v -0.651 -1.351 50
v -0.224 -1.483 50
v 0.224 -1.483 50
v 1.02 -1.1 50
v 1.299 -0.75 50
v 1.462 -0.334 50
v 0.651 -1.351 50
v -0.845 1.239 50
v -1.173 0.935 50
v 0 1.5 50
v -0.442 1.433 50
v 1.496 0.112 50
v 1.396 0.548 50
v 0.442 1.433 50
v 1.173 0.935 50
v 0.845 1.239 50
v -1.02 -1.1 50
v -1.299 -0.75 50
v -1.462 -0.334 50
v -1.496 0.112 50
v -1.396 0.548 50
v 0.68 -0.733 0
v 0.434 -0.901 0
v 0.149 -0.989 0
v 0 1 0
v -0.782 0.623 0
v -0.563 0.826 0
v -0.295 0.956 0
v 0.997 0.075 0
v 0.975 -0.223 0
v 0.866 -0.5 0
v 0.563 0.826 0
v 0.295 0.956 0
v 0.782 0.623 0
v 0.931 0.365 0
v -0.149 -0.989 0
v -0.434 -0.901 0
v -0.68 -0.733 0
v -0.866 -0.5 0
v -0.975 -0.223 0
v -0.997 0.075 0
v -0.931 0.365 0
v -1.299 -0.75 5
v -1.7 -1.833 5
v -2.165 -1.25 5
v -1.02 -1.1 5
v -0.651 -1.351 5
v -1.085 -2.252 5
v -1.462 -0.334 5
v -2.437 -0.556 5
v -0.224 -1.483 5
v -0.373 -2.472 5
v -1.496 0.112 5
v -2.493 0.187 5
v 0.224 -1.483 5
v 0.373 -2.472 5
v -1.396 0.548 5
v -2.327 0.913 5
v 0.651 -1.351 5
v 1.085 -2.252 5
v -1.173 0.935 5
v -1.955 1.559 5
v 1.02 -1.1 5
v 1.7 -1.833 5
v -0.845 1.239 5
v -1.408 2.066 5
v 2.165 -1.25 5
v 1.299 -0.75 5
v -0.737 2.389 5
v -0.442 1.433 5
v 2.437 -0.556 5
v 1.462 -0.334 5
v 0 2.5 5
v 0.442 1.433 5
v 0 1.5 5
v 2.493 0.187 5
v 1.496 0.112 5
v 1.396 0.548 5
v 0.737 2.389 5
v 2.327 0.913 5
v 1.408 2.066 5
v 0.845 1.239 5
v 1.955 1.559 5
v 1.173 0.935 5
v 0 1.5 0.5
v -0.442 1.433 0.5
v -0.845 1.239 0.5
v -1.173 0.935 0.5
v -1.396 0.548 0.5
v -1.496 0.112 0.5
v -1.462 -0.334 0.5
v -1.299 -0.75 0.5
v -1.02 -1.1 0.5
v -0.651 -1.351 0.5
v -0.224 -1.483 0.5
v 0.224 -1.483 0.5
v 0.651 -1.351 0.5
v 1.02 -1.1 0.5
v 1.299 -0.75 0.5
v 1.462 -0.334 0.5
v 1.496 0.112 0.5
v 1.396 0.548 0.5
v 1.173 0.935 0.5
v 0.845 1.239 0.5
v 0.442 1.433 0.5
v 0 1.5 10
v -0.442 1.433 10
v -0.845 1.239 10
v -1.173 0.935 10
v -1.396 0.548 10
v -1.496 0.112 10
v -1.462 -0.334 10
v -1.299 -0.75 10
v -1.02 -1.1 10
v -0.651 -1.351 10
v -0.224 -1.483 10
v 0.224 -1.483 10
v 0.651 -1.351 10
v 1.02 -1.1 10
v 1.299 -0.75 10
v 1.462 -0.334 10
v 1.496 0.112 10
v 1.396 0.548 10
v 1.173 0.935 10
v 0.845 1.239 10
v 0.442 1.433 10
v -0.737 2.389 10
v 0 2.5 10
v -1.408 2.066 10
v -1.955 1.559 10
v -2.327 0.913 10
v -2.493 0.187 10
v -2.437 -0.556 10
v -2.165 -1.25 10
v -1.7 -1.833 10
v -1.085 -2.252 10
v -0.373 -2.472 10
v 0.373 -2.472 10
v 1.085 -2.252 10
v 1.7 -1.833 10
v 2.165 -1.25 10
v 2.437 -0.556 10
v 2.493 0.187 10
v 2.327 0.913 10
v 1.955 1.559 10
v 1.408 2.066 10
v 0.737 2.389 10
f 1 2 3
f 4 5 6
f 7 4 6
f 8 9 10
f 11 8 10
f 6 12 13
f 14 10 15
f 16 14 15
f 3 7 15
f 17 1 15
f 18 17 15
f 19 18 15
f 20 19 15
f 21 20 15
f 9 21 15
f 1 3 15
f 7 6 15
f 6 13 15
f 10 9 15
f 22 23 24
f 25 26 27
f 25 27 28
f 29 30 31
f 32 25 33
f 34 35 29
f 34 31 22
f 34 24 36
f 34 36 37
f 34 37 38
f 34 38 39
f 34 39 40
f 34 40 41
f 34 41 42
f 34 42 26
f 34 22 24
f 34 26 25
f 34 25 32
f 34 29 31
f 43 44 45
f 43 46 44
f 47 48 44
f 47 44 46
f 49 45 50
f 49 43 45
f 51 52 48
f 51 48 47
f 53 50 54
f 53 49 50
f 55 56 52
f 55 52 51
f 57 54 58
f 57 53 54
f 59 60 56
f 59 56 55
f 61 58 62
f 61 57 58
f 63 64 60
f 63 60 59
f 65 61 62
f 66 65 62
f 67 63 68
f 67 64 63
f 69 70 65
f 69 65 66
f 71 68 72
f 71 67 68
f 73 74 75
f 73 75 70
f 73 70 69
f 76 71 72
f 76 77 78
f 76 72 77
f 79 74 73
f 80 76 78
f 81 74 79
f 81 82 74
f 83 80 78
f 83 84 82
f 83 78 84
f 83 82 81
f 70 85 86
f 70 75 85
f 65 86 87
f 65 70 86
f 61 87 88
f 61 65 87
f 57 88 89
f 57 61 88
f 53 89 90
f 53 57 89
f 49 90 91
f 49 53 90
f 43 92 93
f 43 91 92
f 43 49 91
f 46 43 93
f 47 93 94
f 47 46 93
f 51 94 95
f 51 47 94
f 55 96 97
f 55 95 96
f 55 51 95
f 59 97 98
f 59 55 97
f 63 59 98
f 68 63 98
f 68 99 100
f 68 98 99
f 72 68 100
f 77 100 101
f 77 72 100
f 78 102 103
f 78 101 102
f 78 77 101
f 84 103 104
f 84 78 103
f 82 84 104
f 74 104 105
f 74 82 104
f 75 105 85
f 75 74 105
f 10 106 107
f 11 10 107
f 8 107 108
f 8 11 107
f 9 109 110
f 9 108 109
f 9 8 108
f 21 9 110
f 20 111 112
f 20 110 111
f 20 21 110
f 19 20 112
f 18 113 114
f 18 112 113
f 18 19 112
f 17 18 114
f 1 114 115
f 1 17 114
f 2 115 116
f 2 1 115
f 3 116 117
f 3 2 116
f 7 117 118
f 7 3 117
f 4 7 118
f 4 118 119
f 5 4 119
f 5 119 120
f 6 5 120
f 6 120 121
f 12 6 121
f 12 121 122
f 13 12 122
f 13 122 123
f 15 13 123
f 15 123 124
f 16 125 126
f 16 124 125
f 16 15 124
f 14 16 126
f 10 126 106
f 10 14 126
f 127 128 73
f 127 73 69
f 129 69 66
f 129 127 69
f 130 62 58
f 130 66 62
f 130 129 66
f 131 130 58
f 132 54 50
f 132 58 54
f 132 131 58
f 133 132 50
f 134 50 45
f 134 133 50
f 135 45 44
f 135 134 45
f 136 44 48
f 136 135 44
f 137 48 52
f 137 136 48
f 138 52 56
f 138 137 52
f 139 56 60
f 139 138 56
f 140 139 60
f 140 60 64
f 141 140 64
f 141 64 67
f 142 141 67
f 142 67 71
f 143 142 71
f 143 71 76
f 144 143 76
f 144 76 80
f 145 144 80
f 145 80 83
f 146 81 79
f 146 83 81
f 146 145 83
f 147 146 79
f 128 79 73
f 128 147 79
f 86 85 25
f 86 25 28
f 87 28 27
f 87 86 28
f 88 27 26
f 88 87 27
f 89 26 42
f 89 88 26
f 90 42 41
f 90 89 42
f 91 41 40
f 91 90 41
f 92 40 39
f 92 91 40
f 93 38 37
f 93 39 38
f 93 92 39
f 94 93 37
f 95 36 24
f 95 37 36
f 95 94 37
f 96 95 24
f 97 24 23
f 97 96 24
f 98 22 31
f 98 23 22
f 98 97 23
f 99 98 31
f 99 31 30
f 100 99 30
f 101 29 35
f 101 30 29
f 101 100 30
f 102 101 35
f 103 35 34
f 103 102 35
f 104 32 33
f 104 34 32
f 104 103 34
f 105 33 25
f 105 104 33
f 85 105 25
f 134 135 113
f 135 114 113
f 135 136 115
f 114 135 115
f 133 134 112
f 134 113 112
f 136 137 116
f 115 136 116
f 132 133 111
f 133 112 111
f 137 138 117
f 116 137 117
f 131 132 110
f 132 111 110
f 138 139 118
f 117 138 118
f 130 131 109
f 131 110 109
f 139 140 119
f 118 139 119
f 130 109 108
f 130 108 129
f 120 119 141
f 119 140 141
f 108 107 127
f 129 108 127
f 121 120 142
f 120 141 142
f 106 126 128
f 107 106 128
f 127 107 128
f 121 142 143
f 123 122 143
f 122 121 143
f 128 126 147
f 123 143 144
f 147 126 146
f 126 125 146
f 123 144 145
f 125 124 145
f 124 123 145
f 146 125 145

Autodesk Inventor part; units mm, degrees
ref_plane "YZ Plane" through (0, 0, 0) normal (1, 0, 0) x (0, 1, 0)
ref_plane "XZ Plane" through (0, 0, 0) normal (0, 1, 0) x (-1, 0, 0)
ref_plane "XY Plane" through (0, 0, 0) normal (0, 0, 1) x (1, 0, 0)
sketch "Esquisse2" plane through (0, 0, 0) normal (1, 0, 0) x (0, 1, 0)
  line L0 (0, 0) -> (0, -2.1683)
  line L1 (0, 0) -> (0, 50)
  line L2 (0, 0) -> (1.5, 0)
  line L3 (1.5, 0) -> (1.5, 5)
  line L4 (1.5, 5) -> (2.5, 5)
  line L5 (2.5, 5) -> (2.5, 10)
  line L6 (2.5, 10) -> (1.5, 10)
  line L7 (1.5, 10) -> (1.5, 50)
  line L8 (0, 50) -> (1.5, 50)
  dimension "d0" = 3
  dimension "d1" = 1
  dimension "d2" = 5
  dimension "d3" = 5
  dimension "d4" = 40
revolve "Révolution1" add sketch "Esquisse2" angle 360 about axis through (0, 0, 0) along (0, 0, -1)
thread "Filetage1" size "M3x0.5" class "6g" standard "ISO Metric profile" full length
chamfer "Chanfrein1" distance 0.5 angle 45 1 edges at (0, -1.5, 0)
properties part number "piston_axe"
